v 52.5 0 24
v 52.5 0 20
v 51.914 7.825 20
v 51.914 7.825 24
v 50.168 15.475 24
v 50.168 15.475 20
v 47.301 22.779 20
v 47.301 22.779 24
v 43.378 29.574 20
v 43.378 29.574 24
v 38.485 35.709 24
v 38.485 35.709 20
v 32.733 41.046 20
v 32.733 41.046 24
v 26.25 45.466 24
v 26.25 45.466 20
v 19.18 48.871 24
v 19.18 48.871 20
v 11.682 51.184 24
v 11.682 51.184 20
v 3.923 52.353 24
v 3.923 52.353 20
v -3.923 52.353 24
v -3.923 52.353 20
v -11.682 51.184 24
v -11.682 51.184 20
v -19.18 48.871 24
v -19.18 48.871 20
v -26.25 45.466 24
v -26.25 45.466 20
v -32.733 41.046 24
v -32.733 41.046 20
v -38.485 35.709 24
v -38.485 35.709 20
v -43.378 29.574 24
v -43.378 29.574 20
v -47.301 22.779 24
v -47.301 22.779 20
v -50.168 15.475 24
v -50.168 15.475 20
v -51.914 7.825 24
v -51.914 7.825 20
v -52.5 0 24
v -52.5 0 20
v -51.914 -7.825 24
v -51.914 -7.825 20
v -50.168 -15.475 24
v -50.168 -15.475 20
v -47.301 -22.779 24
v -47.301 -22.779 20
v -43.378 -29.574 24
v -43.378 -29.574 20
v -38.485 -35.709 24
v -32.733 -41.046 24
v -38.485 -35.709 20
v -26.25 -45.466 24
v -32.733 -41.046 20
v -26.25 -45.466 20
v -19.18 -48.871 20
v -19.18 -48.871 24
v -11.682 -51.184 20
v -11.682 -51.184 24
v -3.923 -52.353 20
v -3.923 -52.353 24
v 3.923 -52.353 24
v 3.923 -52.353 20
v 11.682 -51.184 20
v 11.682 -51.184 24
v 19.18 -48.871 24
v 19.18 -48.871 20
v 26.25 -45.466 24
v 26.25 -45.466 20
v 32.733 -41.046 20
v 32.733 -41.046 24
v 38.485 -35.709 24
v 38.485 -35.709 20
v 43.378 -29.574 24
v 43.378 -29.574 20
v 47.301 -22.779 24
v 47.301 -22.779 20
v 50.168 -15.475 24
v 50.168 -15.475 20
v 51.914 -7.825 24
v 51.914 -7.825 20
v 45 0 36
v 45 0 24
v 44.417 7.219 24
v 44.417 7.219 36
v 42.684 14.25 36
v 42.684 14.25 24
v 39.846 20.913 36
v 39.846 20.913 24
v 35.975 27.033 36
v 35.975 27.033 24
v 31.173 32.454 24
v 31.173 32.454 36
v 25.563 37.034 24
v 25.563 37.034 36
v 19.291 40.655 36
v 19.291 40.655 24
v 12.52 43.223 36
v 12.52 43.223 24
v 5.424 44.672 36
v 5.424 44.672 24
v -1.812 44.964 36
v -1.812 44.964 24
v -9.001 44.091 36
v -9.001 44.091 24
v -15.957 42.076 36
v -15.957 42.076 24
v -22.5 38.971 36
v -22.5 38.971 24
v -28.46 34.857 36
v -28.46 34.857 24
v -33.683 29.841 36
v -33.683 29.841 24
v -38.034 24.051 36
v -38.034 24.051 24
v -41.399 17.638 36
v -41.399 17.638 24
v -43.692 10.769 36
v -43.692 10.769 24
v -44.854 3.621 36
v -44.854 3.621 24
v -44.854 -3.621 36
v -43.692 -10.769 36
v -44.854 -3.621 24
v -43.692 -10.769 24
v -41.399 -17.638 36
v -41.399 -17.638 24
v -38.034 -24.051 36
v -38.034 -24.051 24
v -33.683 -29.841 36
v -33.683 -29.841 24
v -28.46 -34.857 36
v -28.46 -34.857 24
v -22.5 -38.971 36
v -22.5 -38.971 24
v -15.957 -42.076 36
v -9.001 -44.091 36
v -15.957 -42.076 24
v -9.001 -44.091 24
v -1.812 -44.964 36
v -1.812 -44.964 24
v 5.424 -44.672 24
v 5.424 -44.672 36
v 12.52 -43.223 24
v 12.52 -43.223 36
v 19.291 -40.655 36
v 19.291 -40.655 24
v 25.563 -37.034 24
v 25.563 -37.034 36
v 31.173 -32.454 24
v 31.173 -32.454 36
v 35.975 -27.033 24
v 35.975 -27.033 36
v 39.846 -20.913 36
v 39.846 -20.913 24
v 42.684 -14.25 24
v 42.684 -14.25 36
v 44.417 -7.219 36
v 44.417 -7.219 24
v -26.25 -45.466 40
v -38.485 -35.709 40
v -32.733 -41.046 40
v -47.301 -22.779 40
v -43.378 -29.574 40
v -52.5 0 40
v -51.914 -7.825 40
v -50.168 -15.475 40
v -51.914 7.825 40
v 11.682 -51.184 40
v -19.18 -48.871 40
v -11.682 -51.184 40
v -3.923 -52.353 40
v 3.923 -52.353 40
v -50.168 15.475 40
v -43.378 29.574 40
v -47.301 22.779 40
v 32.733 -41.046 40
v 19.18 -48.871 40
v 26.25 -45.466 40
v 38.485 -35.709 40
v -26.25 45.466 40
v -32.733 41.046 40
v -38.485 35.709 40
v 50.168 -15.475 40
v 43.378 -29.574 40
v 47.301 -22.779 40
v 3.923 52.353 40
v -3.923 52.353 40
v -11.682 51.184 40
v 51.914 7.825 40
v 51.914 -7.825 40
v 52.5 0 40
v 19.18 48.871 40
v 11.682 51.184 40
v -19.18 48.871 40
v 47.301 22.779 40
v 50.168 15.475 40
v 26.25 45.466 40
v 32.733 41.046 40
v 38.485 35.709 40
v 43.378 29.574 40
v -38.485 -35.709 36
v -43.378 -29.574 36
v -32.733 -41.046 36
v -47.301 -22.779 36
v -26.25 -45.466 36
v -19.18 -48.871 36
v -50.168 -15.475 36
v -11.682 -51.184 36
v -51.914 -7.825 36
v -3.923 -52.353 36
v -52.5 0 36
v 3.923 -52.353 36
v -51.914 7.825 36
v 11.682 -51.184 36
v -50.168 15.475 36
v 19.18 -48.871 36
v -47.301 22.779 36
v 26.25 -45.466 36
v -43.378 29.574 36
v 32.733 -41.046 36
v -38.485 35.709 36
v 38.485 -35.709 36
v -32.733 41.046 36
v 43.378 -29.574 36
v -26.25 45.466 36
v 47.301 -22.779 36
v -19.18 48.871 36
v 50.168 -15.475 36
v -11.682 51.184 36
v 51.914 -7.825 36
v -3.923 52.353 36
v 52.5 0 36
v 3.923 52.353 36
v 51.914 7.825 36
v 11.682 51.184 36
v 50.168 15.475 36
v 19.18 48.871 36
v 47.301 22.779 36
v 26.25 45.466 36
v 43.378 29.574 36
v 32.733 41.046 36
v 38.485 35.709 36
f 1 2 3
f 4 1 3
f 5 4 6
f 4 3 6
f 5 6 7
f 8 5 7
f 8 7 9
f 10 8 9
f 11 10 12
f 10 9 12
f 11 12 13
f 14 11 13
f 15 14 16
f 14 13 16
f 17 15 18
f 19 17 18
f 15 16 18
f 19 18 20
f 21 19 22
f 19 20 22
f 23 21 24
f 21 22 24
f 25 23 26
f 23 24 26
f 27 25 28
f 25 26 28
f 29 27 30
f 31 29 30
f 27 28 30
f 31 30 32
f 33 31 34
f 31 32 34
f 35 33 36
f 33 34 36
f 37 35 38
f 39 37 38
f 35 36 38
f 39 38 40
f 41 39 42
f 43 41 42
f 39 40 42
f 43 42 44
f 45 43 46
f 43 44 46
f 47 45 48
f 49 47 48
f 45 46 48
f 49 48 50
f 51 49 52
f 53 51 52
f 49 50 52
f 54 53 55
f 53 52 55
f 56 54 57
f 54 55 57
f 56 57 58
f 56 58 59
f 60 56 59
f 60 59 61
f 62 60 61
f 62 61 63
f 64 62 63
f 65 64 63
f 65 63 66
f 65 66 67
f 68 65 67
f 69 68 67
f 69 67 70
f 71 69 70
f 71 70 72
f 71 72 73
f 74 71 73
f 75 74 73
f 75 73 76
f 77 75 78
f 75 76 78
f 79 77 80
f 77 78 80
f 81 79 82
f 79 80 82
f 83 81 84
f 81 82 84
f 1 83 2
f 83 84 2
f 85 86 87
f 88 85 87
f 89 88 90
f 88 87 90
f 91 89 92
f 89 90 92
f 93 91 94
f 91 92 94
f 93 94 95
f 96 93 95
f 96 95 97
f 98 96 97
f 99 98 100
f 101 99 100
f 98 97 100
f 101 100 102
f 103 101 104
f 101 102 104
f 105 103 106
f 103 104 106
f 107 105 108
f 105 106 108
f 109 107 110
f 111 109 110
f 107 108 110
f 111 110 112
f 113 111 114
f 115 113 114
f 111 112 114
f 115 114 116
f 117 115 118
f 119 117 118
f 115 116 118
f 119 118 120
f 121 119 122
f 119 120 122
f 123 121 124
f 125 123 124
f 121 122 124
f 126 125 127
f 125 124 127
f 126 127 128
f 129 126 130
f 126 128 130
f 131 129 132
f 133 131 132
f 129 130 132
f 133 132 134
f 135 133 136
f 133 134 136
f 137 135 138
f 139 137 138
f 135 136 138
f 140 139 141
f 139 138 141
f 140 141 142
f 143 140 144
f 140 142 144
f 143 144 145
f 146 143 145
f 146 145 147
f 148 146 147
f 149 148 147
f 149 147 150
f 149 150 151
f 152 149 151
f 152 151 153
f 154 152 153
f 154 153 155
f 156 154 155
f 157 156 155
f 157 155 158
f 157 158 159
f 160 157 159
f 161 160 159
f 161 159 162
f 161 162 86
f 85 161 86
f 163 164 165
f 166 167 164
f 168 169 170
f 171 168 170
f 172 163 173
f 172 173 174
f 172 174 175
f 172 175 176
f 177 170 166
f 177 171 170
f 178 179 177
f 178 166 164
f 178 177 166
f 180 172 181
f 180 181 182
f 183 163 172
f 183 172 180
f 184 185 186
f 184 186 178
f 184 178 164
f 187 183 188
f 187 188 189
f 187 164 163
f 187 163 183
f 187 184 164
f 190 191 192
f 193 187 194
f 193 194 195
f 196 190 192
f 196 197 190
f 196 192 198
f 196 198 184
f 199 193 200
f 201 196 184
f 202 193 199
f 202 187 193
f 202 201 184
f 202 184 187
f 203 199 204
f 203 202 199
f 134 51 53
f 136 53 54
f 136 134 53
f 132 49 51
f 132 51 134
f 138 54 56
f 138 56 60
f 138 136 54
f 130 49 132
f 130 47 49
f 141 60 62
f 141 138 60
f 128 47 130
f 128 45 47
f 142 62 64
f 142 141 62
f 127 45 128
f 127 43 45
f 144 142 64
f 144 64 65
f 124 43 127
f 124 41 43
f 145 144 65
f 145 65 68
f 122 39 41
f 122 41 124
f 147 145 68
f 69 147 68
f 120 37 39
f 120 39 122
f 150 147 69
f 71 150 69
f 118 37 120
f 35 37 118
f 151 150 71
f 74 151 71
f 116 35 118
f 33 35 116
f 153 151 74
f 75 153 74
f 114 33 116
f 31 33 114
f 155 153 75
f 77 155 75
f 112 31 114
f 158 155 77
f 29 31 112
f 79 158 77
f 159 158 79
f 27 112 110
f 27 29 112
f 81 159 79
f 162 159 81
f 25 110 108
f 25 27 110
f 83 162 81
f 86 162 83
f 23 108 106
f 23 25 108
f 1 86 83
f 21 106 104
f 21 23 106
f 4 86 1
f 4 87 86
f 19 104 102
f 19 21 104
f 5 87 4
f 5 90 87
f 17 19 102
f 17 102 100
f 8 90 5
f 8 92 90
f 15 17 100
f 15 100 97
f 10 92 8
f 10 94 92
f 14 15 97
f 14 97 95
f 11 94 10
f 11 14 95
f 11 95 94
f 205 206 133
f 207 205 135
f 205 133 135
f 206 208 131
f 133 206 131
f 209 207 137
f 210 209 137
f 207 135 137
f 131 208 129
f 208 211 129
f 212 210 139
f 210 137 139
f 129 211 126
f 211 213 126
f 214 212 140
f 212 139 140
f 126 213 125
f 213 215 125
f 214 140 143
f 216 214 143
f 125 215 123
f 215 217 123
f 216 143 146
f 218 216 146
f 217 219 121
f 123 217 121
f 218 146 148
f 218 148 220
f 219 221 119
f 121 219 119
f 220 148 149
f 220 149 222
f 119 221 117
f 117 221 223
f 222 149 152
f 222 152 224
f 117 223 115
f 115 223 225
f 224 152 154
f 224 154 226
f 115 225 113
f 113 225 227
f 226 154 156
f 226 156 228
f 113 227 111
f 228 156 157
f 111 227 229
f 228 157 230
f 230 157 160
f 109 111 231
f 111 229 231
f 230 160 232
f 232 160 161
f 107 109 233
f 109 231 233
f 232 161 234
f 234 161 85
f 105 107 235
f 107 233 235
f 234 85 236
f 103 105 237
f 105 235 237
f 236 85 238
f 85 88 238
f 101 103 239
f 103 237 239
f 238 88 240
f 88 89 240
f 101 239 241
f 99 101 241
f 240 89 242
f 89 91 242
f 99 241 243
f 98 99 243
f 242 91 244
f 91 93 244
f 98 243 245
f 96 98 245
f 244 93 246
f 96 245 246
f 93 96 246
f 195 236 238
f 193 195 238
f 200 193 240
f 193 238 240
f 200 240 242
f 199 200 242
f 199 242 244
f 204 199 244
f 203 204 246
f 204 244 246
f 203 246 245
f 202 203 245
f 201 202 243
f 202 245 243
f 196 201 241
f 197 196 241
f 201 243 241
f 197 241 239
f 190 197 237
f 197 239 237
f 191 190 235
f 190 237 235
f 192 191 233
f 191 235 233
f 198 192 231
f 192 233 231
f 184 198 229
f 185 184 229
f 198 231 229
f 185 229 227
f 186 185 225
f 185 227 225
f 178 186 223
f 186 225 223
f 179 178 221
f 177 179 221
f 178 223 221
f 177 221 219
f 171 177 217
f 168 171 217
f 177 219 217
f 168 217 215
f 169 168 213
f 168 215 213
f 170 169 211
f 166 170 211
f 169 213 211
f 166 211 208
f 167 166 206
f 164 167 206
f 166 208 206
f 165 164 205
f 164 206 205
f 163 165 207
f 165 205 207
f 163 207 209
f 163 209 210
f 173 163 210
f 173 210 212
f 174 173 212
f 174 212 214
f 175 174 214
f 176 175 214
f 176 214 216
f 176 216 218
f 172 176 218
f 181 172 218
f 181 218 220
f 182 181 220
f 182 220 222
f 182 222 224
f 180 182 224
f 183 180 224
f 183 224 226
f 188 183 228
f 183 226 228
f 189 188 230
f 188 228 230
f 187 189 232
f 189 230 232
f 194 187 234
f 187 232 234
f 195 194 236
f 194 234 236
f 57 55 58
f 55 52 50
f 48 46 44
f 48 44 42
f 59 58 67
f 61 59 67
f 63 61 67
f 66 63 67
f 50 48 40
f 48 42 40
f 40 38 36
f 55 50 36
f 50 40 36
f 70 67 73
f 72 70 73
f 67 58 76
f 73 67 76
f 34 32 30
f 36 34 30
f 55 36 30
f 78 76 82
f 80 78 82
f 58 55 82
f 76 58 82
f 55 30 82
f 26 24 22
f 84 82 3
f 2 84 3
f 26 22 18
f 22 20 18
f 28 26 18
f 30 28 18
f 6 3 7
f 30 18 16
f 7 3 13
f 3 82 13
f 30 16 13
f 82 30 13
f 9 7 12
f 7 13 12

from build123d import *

# Parameters (mm, degrees)
F2_R     = 52.5
F3_DEPTH = 4
F5_R     = 45
F6_DEPTH = 12
F8_R     = 52.5
F9_DEPTH = 4


with BuildPart() as f3:
    # F2 (on Top) → F3 (new body)
    with BuildSketch(Plane.XY):
        Circle(F2_R)
    extrude(amount=F3_DEPTH)

    # F5 (on offset) → F6 (join)
    with BuildSketch(Plane.XY.offset(4)):
        Circle(F5_R)
    extrude(amount=F6_DEPTH)

    # F8 (on offset) → F9 (join)
    with BuildSketch(Plane.XY.offset(16)):
        Circle(F8_R)
    extrude(amount=F9_DEPTH)


with BuildPart() as f10_1:
    # F10: copy of F3
    add(f3.part.moved(Location((0, 0, 20))))


with BuildPart() as f12_1:
    # F12: copy of F3
    add(f3.part)


with BuildPart() as f3_1:
    # F14: moved
    add(f3.part.moved(Location((0, 0, 20))))


solid = f3_1.part
